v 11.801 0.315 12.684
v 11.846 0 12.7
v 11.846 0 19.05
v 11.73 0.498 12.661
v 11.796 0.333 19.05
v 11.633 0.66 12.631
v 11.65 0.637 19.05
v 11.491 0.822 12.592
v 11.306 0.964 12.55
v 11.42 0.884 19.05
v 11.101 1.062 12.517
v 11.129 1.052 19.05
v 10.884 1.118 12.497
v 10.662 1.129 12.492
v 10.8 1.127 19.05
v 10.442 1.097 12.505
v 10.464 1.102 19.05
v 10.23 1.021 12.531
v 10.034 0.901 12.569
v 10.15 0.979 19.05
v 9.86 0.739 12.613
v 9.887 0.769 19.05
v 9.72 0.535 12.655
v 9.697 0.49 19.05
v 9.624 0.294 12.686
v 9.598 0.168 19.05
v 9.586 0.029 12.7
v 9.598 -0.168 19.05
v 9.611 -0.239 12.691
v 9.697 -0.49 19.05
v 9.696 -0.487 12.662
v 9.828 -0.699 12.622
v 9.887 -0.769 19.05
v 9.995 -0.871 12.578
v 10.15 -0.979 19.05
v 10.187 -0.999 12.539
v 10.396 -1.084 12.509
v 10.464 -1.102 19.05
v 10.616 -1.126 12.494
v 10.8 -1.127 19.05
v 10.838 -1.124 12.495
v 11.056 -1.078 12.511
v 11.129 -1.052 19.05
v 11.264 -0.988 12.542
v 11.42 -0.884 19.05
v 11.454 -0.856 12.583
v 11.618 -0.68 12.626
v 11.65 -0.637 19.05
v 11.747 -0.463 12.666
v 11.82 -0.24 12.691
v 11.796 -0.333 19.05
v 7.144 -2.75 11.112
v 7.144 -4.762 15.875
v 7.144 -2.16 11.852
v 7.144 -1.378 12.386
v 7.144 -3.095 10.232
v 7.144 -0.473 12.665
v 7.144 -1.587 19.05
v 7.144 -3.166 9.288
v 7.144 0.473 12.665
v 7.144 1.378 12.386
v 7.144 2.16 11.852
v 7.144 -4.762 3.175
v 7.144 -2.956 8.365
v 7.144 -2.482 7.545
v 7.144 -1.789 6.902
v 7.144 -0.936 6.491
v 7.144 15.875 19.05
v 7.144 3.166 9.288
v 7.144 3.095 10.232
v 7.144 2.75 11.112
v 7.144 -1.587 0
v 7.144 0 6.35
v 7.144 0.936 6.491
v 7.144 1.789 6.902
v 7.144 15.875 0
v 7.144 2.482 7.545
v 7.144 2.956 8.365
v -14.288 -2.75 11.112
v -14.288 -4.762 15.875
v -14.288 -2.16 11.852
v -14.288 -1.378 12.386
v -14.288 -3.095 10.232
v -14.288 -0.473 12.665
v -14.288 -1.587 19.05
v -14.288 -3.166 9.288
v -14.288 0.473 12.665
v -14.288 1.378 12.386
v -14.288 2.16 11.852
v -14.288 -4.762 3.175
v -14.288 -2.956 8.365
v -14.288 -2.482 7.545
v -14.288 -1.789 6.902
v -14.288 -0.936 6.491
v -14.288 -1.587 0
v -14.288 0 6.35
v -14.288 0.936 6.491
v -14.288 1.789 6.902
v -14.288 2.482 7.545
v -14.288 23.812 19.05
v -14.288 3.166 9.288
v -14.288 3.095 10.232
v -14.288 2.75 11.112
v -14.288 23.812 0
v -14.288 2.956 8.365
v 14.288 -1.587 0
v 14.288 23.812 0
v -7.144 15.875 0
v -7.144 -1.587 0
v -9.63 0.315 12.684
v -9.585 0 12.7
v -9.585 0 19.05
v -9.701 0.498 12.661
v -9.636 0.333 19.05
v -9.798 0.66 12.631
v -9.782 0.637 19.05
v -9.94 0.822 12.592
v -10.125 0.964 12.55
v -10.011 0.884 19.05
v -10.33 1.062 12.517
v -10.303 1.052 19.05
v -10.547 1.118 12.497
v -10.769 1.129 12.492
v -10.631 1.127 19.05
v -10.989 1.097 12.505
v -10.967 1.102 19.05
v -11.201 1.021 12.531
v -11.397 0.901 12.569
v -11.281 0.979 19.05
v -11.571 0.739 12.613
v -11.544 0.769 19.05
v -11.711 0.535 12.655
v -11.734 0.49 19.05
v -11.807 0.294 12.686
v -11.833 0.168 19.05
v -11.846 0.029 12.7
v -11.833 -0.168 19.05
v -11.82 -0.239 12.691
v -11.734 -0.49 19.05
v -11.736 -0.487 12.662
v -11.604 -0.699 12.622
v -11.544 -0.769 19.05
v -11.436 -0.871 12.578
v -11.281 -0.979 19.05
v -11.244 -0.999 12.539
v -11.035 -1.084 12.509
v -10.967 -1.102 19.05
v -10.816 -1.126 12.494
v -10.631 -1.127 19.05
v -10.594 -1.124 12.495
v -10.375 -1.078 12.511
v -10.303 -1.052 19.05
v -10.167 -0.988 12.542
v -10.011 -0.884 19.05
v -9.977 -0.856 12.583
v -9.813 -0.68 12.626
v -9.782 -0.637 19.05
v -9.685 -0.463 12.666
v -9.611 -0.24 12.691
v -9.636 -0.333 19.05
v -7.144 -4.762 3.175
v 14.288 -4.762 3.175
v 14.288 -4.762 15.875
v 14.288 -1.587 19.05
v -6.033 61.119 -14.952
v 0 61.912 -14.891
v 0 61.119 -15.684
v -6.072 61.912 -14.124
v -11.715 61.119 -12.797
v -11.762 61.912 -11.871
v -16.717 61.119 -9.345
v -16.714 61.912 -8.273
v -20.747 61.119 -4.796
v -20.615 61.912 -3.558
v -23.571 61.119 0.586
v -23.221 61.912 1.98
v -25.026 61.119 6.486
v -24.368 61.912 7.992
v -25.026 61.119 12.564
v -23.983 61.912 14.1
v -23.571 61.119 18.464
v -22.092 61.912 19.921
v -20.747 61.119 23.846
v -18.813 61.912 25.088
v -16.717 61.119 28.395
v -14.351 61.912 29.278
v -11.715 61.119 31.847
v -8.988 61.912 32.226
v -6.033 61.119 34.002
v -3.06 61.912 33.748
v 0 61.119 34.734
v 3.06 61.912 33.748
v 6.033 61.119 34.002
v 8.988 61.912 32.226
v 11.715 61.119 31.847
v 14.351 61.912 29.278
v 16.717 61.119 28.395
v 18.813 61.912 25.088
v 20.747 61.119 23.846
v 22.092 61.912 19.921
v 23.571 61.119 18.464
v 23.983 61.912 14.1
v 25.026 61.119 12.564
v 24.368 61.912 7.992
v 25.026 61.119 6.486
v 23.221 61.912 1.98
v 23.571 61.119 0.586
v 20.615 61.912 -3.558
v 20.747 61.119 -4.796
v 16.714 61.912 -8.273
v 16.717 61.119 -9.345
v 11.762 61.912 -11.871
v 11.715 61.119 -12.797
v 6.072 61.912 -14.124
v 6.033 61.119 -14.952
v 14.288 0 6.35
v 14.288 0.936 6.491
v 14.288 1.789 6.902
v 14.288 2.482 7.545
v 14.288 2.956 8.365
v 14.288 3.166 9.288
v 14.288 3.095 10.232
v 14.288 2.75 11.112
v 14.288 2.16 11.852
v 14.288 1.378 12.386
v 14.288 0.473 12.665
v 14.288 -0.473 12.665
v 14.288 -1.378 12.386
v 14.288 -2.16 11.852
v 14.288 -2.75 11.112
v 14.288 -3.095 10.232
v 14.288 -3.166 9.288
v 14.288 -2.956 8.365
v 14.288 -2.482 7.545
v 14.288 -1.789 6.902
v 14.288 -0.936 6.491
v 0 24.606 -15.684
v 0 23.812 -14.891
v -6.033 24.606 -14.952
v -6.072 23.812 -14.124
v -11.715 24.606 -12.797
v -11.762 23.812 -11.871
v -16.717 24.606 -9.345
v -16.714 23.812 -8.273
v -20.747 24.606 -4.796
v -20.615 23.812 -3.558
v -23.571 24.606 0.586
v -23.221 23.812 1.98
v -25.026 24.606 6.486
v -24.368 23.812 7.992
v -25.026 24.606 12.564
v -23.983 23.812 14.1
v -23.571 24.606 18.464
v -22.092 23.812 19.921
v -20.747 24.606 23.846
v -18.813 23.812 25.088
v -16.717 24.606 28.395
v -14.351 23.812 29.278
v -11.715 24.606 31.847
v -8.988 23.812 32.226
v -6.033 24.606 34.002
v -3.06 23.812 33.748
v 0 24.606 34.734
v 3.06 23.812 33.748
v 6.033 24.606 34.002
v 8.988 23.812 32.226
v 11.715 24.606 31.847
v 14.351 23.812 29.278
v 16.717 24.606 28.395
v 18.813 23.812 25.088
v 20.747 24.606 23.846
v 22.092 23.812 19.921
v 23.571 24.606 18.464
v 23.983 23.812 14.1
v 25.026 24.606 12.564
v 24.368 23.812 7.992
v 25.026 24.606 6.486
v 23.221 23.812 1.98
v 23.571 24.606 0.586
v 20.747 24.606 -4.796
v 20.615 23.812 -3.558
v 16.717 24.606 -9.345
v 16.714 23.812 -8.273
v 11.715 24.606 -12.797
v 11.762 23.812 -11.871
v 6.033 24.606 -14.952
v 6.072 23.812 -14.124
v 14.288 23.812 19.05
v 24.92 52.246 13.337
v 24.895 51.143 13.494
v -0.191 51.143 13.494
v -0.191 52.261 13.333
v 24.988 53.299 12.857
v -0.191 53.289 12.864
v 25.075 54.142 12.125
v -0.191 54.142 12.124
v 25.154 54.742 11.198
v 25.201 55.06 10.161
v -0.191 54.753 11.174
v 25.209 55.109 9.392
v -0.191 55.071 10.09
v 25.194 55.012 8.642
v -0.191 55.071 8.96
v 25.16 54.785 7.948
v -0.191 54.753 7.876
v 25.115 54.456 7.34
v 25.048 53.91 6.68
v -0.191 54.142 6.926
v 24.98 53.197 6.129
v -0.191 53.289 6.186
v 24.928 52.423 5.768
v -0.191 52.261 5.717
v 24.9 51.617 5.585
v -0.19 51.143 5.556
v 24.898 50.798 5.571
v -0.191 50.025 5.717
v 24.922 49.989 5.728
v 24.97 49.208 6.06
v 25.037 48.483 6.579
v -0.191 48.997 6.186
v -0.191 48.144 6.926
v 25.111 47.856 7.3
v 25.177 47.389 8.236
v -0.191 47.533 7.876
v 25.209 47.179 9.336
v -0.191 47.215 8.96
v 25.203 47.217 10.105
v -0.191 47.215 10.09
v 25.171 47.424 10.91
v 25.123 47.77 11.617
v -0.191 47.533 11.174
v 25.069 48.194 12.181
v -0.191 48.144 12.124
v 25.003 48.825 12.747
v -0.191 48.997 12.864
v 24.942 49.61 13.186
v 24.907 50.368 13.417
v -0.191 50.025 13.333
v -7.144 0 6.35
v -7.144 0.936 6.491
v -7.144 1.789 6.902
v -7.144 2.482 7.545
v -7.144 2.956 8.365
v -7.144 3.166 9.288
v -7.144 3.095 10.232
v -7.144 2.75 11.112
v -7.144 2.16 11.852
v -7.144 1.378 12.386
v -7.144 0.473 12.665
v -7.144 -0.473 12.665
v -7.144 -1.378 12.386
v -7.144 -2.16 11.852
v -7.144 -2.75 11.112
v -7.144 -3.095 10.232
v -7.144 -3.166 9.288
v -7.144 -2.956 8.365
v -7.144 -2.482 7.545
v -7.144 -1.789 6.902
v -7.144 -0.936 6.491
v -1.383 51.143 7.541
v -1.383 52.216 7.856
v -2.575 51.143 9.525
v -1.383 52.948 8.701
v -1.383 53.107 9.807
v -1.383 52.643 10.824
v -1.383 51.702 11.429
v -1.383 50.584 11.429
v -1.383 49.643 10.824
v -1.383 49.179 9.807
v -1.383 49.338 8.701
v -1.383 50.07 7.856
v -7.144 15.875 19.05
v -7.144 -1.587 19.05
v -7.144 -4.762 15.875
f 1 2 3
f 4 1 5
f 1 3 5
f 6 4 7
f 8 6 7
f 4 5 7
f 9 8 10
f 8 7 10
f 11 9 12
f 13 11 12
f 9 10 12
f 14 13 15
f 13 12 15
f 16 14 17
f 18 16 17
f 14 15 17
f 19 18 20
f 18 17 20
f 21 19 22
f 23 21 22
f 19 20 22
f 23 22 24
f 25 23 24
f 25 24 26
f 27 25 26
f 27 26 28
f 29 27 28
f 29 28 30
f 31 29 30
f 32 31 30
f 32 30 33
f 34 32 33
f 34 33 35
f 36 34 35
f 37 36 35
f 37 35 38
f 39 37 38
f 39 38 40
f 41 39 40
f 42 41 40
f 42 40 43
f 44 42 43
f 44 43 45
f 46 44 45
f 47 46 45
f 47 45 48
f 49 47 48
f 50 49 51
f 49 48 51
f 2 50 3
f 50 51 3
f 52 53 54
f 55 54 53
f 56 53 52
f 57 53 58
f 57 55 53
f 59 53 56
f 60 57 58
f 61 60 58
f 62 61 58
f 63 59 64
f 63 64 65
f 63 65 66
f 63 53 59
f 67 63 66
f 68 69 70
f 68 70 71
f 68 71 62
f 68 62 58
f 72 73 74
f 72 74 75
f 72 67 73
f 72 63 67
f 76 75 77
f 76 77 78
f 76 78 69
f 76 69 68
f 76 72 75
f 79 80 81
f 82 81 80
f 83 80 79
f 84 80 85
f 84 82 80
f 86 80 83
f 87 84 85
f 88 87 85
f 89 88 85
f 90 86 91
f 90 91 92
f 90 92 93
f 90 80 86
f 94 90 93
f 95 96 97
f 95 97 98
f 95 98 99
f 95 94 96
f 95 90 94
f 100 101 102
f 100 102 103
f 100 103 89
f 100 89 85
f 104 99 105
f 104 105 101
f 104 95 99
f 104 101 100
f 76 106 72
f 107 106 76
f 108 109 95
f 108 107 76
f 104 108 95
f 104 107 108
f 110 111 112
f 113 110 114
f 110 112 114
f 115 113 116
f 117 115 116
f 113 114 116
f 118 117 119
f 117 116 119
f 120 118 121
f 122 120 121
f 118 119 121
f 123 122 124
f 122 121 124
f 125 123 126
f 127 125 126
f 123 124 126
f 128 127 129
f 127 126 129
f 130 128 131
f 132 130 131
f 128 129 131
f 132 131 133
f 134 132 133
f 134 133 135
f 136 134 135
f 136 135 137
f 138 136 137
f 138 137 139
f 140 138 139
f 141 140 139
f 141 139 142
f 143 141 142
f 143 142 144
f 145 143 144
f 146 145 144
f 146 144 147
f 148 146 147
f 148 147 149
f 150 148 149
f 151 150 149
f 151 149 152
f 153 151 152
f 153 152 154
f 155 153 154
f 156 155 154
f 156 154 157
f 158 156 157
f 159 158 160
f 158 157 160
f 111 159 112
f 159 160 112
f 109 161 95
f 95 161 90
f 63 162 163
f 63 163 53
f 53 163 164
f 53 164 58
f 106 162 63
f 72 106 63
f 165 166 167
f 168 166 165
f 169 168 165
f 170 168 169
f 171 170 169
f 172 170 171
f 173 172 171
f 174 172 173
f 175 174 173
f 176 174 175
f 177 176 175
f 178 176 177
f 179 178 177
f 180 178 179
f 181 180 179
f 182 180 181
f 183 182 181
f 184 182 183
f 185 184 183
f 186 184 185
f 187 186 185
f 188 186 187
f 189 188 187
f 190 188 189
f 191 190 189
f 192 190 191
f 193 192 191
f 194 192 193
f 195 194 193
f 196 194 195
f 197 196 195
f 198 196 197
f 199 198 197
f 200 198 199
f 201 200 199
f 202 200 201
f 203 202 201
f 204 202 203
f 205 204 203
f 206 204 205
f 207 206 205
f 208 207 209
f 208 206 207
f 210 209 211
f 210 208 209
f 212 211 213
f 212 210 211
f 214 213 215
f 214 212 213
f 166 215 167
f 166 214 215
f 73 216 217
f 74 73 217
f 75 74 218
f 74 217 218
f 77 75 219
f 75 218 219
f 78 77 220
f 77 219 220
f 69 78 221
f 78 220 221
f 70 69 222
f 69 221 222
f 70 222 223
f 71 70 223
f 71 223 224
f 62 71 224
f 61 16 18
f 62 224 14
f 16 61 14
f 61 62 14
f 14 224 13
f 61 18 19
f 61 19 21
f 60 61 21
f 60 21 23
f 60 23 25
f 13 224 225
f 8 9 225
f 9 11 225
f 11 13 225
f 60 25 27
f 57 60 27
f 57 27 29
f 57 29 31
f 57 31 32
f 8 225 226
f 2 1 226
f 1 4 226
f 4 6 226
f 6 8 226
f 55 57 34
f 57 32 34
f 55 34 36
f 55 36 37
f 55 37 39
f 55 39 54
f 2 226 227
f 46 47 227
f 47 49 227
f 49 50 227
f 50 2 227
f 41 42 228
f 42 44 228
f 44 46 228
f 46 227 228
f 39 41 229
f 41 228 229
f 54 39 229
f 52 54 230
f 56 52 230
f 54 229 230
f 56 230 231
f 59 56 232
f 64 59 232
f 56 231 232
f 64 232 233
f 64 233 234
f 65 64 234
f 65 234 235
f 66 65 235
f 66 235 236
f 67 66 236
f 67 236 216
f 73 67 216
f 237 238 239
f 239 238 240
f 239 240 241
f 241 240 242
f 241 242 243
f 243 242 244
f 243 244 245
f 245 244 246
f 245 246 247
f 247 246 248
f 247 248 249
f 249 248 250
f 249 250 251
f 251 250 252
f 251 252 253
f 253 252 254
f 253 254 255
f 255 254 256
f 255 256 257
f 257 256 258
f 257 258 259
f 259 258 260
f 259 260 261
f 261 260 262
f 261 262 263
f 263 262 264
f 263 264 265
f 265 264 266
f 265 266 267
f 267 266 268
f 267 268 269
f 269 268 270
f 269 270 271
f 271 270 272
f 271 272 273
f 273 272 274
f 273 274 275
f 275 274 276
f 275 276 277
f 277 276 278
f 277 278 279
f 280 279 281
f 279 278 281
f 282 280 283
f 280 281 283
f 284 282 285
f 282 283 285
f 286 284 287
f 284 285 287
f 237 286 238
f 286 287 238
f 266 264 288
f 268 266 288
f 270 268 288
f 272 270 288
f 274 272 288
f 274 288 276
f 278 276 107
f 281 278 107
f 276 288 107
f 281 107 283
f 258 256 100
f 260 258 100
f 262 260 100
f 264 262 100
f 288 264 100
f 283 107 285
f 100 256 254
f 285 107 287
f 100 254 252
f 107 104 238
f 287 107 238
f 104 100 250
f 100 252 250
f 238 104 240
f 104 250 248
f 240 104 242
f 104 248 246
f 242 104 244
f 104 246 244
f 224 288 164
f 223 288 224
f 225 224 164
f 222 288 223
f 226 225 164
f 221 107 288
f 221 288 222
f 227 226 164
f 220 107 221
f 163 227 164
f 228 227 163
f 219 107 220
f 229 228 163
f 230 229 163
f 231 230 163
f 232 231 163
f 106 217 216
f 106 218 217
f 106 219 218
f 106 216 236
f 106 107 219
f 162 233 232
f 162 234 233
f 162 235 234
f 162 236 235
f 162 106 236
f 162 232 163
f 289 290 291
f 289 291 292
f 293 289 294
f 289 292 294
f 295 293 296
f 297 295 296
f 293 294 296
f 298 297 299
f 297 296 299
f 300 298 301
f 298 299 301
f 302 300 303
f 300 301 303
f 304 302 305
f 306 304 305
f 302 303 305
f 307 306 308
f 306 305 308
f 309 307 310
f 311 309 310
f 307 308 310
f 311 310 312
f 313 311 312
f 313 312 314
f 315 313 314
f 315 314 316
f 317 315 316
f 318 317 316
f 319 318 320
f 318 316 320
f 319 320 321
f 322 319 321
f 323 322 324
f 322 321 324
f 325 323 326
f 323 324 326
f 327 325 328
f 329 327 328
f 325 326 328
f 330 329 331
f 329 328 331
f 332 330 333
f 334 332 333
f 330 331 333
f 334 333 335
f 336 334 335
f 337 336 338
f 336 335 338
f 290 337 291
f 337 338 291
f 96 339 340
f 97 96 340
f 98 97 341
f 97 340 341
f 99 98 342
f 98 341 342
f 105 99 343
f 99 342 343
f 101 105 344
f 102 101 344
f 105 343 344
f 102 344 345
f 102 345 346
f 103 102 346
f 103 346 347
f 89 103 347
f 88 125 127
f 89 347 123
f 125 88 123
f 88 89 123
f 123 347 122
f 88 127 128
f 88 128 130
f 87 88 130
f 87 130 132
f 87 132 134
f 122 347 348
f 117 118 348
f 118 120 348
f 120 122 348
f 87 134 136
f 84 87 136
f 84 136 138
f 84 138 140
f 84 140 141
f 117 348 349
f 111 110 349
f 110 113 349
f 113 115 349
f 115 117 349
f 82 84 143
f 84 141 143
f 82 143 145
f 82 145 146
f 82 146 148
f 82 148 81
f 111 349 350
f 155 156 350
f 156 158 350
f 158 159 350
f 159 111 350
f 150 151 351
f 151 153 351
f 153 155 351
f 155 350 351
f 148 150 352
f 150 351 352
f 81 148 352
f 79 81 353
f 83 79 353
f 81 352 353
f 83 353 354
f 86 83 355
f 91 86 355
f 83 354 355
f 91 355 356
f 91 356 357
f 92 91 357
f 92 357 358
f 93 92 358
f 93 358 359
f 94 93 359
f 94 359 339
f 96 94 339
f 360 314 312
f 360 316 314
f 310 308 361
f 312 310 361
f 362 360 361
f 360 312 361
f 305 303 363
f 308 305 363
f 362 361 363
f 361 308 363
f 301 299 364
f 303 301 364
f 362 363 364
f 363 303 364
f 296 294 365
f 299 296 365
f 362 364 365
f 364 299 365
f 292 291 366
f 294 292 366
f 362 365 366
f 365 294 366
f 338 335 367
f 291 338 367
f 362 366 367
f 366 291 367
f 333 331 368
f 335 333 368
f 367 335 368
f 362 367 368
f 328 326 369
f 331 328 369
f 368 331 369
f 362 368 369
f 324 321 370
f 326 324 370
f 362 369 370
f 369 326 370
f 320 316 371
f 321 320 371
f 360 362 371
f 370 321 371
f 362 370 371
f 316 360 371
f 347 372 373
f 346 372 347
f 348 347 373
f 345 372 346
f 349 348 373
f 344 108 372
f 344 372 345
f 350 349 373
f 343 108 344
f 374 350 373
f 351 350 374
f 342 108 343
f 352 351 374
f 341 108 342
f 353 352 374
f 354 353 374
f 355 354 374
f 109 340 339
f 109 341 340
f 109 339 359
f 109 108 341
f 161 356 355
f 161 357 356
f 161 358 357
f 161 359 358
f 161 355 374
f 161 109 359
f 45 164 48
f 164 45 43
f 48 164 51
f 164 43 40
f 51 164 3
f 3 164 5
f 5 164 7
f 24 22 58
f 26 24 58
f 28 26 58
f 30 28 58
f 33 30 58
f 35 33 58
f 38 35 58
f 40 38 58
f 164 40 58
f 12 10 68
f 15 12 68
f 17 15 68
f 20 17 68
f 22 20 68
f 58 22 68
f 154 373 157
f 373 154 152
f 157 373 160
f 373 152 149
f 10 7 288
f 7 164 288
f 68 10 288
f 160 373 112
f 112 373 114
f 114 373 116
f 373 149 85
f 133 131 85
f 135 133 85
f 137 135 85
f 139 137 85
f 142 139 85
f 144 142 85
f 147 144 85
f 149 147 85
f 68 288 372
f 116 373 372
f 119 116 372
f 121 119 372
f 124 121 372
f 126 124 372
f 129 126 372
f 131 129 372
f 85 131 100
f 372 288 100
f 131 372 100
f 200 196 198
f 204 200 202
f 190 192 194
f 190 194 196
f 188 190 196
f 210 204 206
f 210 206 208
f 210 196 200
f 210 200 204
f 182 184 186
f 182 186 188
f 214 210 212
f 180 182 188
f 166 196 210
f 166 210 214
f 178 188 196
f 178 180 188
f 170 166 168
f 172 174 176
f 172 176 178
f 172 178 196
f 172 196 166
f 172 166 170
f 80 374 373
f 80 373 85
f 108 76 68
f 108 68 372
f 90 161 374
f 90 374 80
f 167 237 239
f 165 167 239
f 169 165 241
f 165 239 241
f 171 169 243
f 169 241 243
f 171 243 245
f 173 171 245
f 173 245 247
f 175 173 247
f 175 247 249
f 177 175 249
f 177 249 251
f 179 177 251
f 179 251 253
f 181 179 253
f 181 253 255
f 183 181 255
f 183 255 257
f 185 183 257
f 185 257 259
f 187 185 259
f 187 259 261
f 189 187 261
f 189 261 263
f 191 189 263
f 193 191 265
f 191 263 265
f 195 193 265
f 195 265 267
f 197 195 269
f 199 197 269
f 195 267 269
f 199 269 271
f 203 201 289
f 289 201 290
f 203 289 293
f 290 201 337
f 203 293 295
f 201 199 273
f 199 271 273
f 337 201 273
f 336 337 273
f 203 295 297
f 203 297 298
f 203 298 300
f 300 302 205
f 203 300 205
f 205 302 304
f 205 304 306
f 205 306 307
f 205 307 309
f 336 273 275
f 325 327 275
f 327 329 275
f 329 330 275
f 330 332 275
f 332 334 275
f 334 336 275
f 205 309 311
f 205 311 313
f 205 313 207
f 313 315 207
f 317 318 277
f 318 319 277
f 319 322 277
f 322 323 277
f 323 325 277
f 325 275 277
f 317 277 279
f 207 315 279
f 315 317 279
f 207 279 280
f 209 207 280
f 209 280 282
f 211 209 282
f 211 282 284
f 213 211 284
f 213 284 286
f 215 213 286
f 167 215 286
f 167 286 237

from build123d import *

# Parameters (mm, degrees)
BOSS_EXTRUDE1_DEPTH         = 19.05
SKETCH2_R                   = 3.175
CUT_EXTRUDE1_DEPTH          = 42.790767895
CHAMFER1_SIZE               = 3.175
SKETCH3_R                   = 25.2095
BOSS_EXTRUDE2_DEPTH         = 38.1
CHAMFER2_SIZE               = 0.79375
F_4_40_TAPPED_HOLE1_REACH   = 77.334
F_4_40_TAPPED_HOLE1_BORE_R  = 1.1303
F_3_8_16_TAPPED_HOLE1_D     = 7.9375
F_3_8_16_TAPPED_HOLE1_DEPTH = 25.4
F_3_8_16_TAPPED_HOLE1_TIP   = 2.384665582


with BuildPart() as part:
    # Sketch1 → Boss-Extrude1 (new body)
    with BuildSketch(Plane.XY):
        Polygon((-7.14375, 15.875), (-7.14375, -4.7625), (-14.2875, -4.7625), (-14.2875, 23.8125), (14.2875, 23.8125), (14.2875, -4.7625), (7.14375, -4.7625), (7.14375, 15.875), align=None)
    extrude(amount=BOSS_EXTRUDE1_DEPTH)

    # Sketch2 → Cut-Extrude1 (cut, through all)
    with BuildSketch(Plane(origin=(14.2875, 0, 0), x_dir=(0, 0, -1), z_dir=(1, 0, 0))):
        with Locations((-9.525, 0)):
            Circle(SKETCH2_R)
    extrude(amount=-CUT_EXTRUDE1_DEPTH, mode=Mode.SUBTRACT)

    # Chamfer1
    chamfer1_edges = [part.edges().sort_by_distance(p)[0] for p in [
        (10.715625, -4.7625, 19.05),
        (-10.715625, -4.7625, 19.05),
        (-10.715625, -4.7625, 0),
        (10.715625, -4.7625, 0),
    ]]
    chamfer(chamfer1_edges, length=CHAMFER1_SIZE)

    # Sketch3 → Boss-Extrude2 (add)
    with BuildSketch(Plane(origin=(0, 23.8125, 0), x_dir=(1, 0, 0), z_dir=(0, 1, 0))):
        with Locations(Location((0, -9.525, 0), (0, 0, 90))):
            Circle(SKETCH3_R)
    extrude(amount=BOSS_EXTRUDE2_DEPTH)

    # Chamfer2
    chamfer2_edges = [part.edges().sort_by_distance(p)[0] for p in [
        (0, 23.8125, 34.7345),
        (0, 61.9125, 34.7345),
    ]]
    chamfer(chamfer2_edges, length=CHAMFER2_SIZE)

    # #4-40 Tapped Hole1 bore → #4-40 Tapped Hole1 (cut, up to next)
    with BuildSketch(Plane.XY.offset(19.05), mode=Mode.PRIVATE) as f_4_40_tapped_hole1_sk1:
        with Locations((-10.715625, 0)):
            Circle(F_4_40_TAPPED_HOLE1_BORE_R)
    f_4_40_tapped_hole1_tool1 = extrude(f_4_40_tapped_hole1_sk1.sketch, amount=-F_4_40_TAPPED_HOLE1_REACH, mode=Mode.PRIVATE) & part.part
    # #4-40 Tapped Hole1 bore → #4-40 Tapped Hole1 (cut, up to next)
    with BuildSketch(Plane.XY.offset(19.05), mode=Mode.PRIVATE) as f_4_40_tapped_hole1_sk2:
        with Locations((10.715625, 0)):
            Circle(F_4_40_TAPPED_HOLE1_BORE_R)
    f_4_40_tapped_hole1_tool2 = extrude(f_4_40_tapped_hole1_sk2.sketch, amount=-F_4_40_TAPPED_HOLE1_REACH, mode=Mode.PRIVATE) & part.part
    add(f_4_40_tapped_hole1_tool1.solids().sort_by_distance((-10.715625, 0, 19.05))[0], mode=Mode.SUBTRACT)
    add(f_4_40_tapped_hole1_tool2.solids().sort_by_distance((10.715625, 0, 19.05))[0], mode=Mode.SUBTRACT)

    # 3/8-16 Tapped Hole1
    with Locations(Plane(origin=(25.2095, 0, 0), x_dir=(0, 0, -1), z_dir=(1, 0, 0))):
        with Locations((-9.525, 51.1429)):
            Hole(F_3_8_16_TAPPED_HOLE1_D / 2, depth=F_3_8_16_TAPPED_HOLE1_DEPTH)
            with Locations((0, 0, -(F_3_8_16_TAPPED_HOLE1_DEPTH + F_3_8_16_TAPPED_HOLE1_TIP / 2))):  # 118° drill point
                Cone(0, F_3_8_16_TAPPED_HOLE1_D / 2, F_3_8_16_TAPPED_HOLE1_TIP, mode=Mode.SUBTRACT)


solid = part.part
